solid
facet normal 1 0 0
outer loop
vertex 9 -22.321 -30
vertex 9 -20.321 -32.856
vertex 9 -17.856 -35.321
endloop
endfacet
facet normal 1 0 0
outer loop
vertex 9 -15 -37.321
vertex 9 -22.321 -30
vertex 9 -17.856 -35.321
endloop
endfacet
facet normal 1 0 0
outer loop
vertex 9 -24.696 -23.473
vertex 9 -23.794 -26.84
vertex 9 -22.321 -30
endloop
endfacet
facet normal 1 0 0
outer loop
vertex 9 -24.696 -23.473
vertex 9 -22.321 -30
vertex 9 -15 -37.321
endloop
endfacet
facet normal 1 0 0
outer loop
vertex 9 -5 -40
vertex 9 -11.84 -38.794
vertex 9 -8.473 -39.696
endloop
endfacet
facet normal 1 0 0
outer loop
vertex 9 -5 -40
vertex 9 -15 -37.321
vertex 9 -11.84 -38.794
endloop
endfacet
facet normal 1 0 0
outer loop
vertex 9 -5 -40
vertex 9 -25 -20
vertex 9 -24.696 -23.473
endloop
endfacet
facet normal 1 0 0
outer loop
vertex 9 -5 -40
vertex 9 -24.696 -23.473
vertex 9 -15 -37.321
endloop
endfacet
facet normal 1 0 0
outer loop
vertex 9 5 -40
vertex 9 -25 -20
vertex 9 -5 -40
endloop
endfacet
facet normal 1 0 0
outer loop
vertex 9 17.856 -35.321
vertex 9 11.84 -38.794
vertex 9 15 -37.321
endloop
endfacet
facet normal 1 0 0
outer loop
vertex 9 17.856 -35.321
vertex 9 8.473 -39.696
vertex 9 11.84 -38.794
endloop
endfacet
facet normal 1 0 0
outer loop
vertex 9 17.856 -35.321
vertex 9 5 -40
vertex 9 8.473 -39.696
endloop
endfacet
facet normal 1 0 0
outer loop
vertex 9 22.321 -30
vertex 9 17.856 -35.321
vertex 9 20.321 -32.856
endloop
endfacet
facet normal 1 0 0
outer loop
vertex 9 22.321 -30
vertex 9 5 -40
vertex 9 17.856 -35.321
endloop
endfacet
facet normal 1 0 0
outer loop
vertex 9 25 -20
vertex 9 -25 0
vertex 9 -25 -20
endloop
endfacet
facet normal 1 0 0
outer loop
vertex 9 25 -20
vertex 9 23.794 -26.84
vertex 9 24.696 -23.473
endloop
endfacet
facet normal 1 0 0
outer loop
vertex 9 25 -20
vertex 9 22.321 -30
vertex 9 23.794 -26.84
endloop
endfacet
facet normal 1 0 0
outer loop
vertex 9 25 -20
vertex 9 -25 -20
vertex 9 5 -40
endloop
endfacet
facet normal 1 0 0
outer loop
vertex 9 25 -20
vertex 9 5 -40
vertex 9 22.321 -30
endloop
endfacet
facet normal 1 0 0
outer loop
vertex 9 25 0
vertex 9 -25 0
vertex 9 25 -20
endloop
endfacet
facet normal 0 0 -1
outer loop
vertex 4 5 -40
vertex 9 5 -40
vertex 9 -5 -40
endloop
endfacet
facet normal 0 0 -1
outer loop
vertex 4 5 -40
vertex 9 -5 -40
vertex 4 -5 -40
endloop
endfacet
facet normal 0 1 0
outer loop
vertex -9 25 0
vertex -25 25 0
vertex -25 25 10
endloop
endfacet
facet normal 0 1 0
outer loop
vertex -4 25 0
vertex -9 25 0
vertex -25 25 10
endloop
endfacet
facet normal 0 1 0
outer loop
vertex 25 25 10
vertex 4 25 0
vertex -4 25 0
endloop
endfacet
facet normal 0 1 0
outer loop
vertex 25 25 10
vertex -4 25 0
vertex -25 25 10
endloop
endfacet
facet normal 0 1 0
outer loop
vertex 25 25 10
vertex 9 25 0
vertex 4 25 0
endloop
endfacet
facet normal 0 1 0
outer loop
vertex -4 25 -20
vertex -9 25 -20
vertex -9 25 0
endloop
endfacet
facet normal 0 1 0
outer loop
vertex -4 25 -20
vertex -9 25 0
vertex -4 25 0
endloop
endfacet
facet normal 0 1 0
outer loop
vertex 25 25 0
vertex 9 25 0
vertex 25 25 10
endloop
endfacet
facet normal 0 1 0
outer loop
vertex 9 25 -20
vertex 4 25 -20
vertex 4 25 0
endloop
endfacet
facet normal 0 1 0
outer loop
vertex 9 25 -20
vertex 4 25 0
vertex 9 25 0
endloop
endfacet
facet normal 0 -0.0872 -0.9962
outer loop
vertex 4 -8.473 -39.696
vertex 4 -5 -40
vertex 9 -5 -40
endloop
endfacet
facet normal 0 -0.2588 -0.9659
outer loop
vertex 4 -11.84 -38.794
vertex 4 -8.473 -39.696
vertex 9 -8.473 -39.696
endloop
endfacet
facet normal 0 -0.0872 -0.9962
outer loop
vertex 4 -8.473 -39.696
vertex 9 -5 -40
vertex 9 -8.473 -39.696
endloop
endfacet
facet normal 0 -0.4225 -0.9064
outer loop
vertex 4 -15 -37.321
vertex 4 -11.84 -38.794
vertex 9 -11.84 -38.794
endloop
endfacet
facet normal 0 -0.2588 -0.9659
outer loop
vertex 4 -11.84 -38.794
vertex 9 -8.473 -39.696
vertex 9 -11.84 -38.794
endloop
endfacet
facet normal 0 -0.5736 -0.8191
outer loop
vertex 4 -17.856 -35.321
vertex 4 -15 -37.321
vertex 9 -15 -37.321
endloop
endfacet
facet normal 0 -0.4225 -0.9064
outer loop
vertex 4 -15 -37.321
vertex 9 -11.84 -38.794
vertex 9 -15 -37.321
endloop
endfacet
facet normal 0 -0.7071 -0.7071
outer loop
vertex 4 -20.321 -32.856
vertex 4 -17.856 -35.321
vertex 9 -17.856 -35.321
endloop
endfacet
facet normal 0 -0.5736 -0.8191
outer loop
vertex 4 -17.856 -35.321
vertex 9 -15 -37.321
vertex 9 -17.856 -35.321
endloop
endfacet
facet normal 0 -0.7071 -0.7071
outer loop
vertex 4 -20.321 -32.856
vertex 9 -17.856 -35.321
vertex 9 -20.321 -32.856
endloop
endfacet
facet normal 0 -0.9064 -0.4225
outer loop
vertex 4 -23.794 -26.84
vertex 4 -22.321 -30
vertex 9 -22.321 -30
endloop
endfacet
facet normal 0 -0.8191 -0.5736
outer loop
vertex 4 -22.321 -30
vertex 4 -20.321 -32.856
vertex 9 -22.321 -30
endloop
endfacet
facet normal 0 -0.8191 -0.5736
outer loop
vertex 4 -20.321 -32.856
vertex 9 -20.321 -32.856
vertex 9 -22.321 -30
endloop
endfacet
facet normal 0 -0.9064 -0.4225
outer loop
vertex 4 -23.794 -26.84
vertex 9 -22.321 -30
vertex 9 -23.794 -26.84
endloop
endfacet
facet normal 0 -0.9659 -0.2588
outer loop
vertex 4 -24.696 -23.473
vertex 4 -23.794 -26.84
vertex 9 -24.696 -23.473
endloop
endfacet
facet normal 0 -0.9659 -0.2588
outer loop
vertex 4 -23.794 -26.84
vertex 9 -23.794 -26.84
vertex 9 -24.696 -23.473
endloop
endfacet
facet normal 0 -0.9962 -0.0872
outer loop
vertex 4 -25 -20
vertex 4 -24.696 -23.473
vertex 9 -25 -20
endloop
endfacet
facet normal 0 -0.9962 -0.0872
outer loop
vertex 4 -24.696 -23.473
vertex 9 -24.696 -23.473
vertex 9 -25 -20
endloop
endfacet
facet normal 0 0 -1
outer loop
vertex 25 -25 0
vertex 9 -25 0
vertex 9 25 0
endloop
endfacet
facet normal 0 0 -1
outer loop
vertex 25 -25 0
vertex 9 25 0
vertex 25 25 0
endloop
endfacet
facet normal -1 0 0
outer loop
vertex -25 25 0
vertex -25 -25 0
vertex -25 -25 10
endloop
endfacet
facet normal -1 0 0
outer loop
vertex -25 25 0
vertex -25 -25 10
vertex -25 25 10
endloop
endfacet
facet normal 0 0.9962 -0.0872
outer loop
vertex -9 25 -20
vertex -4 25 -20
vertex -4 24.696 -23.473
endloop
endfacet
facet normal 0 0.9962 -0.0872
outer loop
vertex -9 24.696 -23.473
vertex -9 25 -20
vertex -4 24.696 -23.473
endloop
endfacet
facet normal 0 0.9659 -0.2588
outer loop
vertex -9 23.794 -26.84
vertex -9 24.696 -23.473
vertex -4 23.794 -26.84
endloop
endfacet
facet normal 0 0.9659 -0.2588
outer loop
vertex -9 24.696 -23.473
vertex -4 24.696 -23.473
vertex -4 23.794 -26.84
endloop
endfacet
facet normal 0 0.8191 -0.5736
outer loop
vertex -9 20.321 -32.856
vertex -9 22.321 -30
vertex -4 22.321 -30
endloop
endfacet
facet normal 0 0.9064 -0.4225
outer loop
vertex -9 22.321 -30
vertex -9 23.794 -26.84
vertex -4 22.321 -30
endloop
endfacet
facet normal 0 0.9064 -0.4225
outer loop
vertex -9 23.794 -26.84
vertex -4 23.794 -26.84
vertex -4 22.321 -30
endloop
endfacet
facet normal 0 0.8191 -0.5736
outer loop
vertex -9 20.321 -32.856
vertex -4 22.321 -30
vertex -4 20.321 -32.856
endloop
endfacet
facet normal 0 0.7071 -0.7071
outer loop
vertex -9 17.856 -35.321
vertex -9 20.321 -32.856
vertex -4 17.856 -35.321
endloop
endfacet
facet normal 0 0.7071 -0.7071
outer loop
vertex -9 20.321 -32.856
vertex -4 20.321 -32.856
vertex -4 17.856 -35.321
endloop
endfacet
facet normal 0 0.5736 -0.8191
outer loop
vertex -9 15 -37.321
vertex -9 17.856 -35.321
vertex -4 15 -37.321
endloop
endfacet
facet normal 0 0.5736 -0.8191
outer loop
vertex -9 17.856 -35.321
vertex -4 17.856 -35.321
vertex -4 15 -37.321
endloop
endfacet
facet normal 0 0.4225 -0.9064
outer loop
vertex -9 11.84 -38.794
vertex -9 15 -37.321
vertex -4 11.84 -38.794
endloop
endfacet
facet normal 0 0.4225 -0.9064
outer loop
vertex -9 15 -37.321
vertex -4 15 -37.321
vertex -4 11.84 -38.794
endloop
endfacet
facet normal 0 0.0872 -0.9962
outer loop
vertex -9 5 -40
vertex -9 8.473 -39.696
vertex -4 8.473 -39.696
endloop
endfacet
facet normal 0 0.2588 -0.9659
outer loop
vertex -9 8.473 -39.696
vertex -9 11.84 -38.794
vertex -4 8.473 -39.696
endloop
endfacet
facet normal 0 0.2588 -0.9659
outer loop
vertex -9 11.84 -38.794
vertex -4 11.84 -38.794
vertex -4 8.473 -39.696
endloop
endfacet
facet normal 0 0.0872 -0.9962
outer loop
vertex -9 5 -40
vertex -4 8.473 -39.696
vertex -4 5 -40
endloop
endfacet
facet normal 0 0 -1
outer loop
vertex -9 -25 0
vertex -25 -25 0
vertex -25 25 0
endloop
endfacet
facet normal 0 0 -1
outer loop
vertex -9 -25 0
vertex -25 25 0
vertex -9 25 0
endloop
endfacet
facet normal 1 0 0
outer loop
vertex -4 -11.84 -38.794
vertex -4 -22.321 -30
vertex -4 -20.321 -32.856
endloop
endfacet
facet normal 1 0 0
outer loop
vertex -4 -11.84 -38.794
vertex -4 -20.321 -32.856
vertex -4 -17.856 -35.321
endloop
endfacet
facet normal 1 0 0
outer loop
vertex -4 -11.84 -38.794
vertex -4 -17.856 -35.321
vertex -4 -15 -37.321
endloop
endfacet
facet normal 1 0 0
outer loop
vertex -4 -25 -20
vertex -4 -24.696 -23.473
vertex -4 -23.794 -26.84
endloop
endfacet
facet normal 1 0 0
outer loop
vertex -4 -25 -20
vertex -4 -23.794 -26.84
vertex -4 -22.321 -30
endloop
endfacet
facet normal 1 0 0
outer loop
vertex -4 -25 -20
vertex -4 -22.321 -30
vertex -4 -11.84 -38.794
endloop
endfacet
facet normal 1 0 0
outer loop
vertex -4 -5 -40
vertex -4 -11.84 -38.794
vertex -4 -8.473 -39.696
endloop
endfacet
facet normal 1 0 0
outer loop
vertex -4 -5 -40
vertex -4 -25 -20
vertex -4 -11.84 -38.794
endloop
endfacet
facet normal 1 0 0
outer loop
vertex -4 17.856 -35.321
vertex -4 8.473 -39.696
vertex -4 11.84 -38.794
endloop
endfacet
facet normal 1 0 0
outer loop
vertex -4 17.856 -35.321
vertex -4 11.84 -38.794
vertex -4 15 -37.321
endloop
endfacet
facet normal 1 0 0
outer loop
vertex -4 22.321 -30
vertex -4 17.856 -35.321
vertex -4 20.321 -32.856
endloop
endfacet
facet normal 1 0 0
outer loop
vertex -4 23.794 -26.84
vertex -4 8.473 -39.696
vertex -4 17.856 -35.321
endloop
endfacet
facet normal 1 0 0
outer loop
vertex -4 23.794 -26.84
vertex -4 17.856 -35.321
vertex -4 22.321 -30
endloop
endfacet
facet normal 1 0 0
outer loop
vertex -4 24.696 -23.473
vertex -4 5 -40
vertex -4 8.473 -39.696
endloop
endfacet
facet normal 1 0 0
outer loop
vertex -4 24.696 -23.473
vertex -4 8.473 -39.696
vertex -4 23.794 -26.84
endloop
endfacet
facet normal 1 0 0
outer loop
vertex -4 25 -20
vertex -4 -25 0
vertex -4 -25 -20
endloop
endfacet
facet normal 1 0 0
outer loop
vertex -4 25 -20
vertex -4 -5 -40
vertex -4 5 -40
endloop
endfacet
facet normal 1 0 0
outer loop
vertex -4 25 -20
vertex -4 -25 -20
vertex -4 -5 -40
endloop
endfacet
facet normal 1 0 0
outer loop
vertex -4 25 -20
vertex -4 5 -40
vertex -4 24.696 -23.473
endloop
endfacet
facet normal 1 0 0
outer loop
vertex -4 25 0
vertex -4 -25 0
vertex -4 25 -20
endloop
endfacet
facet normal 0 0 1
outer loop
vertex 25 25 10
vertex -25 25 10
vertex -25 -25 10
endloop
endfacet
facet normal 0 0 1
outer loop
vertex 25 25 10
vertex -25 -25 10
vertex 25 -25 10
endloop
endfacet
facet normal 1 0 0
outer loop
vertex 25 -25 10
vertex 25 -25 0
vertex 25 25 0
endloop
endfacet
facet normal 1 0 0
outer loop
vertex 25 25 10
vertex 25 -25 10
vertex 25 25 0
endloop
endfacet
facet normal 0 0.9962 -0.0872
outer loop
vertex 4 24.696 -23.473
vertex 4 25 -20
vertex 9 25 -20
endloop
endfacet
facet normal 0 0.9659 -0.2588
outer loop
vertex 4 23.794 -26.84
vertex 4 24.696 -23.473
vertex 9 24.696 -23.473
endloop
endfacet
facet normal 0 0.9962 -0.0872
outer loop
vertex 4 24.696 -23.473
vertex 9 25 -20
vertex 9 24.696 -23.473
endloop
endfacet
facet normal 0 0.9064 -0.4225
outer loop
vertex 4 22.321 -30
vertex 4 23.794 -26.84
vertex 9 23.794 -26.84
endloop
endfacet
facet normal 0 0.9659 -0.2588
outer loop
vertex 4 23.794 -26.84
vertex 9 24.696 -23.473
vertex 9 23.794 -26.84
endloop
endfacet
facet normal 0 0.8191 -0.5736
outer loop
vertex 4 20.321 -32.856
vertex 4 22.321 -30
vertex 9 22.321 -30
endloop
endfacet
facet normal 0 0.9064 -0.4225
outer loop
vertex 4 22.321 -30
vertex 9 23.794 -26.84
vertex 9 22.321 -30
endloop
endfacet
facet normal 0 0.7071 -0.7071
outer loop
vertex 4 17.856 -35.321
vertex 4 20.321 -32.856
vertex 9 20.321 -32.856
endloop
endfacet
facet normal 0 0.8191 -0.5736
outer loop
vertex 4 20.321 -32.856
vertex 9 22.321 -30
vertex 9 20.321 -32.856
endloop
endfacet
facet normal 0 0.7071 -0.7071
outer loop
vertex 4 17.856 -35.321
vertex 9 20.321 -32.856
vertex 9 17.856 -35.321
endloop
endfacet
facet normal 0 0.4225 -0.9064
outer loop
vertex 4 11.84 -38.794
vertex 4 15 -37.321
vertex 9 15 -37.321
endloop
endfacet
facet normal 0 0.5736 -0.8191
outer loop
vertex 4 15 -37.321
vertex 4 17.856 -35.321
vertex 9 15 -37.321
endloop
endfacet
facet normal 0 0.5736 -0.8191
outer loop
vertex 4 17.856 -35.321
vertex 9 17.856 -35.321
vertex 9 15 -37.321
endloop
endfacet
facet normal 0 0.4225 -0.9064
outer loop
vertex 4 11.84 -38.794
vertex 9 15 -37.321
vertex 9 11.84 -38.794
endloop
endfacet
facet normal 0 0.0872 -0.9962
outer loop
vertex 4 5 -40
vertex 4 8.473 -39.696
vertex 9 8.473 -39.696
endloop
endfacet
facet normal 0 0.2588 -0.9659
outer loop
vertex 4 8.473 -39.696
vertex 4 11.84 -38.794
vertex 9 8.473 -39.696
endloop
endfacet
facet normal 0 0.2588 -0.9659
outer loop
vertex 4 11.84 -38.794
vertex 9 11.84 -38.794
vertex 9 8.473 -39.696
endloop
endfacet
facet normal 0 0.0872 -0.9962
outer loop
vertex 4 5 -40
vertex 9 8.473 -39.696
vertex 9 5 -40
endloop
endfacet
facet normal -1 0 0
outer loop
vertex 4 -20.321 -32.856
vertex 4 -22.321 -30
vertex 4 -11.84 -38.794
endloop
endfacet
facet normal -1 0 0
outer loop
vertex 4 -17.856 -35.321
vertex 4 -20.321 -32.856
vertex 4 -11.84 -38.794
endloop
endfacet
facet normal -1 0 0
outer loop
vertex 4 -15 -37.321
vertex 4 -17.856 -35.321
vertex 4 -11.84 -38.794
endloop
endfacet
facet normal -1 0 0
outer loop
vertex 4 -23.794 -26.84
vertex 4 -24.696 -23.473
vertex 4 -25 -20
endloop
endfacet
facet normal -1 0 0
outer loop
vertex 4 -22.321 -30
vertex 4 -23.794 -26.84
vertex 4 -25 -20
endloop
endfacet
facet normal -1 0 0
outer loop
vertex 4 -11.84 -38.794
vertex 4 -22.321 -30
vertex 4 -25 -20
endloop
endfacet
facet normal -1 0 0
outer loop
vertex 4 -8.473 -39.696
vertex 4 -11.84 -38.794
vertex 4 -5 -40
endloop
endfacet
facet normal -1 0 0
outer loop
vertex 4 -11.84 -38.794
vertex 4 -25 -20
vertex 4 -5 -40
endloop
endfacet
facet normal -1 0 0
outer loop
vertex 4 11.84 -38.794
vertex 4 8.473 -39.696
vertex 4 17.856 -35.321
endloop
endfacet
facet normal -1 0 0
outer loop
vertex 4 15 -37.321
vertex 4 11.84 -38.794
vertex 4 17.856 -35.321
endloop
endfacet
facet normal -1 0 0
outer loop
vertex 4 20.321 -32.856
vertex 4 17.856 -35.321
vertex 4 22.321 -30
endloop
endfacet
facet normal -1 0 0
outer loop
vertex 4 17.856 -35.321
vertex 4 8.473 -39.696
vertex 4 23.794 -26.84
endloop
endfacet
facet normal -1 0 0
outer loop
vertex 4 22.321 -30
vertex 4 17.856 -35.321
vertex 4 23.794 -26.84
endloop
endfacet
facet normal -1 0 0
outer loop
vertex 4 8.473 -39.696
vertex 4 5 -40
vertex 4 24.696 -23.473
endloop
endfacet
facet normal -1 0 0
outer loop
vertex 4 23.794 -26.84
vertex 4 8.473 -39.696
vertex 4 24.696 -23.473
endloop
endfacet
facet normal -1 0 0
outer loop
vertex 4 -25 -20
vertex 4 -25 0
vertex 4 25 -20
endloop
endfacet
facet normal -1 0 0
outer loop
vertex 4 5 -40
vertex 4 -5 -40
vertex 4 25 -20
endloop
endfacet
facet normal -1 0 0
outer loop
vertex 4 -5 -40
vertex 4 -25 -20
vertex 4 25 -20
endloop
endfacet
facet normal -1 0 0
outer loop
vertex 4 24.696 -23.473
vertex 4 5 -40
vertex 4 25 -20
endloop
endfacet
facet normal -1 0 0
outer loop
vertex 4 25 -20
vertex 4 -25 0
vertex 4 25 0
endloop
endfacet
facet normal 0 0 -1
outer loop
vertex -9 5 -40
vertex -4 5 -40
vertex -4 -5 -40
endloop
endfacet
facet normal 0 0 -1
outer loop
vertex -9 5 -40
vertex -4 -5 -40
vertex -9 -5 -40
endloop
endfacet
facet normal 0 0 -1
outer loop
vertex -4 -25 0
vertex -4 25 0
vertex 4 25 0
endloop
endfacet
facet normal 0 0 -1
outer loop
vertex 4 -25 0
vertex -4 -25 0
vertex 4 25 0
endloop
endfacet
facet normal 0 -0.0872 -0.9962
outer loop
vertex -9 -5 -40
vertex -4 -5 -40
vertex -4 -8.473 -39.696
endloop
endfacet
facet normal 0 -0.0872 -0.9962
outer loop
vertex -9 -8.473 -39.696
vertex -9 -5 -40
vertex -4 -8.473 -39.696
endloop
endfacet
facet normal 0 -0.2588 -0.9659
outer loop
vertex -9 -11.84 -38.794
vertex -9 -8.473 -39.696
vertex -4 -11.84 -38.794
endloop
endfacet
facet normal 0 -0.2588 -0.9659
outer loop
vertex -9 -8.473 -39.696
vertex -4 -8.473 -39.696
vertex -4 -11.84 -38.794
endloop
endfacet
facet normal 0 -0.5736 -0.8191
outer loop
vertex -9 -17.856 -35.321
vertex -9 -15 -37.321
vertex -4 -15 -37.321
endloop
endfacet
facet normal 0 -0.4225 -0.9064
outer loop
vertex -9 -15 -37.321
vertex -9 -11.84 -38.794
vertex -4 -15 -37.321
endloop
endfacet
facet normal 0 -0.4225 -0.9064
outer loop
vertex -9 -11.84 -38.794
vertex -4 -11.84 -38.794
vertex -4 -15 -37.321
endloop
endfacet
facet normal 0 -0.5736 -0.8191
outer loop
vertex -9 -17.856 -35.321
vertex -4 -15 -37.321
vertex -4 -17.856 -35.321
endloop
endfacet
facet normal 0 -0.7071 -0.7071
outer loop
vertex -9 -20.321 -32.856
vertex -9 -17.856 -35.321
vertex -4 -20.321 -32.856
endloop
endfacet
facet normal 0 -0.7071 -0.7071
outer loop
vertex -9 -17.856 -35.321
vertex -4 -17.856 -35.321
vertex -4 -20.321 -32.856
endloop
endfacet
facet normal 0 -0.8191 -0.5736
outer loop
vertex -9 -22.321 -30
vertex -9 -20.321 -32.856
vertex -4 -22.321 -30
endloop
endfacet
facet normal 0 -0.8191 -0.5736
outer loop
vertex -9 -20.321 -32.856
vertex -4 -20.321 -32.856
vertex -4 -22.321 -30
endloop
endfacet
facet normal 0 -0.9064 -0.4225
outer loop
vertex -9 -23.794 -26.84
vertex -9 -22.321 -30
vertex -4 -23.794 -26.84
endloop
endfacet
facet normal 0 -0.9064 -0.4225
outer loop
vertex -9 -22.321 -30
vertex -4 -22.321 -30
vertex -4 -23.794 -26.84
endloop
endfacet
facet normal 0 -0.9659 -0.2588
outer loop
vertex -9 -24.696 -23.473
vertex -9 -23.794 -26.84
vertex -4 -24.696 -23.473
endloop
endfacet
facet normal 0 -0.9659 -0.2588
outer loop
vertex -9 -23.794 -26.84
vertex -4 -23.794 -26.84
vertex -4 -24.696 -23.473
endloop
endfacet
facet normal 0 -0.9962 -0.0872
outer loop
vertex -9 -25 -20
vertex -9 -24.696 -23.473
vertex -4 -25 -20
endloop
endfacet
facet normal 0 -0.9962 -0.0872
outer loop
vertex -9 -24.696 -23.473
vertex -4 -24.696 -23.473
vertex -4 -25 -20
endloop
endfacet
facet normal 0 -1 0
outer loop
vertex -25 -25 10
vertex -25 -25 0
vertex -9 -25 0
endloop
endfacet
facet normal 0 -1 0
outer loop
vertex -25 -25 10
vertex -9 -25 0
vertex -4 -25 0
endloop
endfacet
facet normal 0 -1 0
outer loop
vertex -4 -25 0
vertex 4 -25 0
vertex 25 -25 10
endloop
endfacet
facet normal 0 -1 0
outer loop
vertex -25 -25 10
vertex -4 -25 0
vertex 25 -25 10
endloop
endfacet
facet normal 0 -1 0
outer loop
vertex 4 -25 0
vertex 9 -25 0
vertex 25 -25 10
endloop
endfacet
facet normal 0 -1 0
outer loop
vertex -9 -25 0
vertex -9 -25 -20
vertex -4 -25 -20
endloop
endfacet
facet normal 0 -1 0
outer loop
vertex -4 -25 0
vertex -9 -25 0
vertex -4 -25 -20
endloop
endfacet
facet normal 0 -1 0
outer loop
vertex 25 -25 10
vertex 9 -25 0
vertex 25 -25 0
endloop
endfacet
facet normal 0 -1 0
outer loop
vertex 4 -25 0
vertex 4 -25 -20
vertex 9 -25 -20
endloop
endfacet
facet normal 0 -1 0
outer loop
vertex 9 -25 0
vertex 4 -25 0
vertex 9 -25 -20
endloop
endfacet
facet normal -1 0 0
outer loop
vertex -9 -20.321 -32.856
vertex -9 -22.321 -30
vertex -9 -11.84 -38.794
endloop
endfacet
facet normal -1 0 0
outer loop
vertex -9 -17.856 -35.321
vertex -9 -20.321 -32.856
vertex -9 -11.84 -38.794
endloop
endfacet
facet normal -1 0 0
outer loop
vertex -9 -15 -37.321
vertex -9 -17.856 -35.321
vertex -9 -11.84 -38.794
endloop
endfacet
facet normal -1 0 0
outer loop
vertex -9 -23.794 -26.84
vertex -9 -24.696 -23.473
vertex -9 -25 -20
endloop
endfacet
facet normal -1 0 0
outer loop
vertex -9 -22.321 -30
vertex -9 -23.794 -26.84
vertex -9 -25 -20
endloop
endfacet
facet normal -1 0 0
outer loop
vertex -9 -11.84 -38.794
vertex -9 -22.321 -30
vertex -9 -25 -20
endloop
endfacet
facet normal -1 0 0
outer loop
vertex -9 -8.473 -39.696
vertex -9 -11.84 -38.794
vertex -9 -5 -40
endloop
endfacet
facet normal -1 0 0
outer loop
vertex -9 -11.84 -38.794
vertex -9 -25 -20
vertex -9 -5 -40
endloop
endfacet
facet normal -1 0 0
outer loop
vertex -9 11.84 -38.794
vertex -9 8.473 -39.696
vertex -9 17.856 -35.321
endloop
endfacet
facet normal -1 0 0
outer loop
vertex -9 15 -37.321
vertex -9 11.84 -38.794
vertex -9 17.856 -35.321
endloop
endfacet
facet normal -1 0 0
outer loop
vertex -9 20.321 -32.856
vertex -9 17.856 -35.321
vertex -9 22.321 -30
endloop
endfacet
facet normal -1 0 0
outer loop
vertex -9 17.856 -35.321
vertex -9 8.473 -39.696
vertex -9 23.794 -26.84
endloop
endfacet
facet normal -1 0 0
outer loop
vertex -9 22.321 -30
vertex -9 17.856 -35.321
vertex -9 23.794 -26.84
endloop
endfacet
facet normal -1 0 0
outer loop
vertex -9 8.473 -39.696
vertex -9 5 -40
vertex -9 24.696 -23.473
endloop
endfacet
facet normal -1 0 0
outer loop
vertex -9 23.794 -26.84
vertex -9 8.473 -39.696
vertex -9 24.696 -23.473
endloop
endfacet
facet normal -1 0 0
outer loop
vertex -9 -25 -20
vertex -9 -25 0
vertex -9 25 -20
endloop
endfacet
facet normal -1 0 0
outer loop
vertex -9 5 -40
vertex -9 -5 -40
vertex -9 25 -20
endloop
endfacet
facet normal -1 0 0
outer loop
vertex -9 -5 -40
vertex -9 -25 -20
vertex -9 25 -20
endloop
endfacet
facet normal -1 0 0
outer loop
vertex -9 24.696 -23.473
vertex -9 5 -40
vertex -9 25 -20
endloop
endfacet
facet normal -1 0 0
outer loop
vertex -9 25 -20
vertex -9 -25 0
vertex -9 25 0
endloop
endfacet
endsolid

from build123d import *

# Parameters (mm, degrees)
SZKIC1_W                                   = 50
SZKIC1_H                                   = 50
DODANIE_WYCI_GNI_CIE1_DEPTH                = 10
SZKIC2_W                                   = 5
SZKIC2_H                                   = 50
DODANIE_WYCI_GNI_CIE2_DEPTH                = 40
WYCI_CIE_WYCI_GNI_CIE_CIENKA_CIANKA2_DEPTH = 40


with BuildPart() as part:
    # Szkic1 → Dodanie-wyciągnięcie1 (new body)
    with BuildSketch(Plane.XY):
        Rectangle(SZKIC1_W, SZKIC1_H)
    extrude(amount=DODANIE_WYCI_GNI_CIE1_DEPTH)

    # Szkic2 → Dodanie-wyciągnięcie2 (add)
    with BuildSketch(Plane(origin=(0, 0, 0), x_dir=(-1, 0, 0), z_dir=(0, 0, -1))):
        with Locations((-6.5, 0)):
            Rectangle(SZKIC2_W, SZKIC2_H)
        with Locations((6.5, 0)):
            Rectangle(SZKIC2_W, SZKIC2_H)
    extrude(amount=DODANIE_WYCI_GNI_CIE2_DEPTH)

    # Szkic4 → Wycięcie-wyciągnięcie-cienka ścianka2 (cut)
    with BuildSketch(Plane(origin=(9, 0, 0), x_dir=(0, 0, -1), z_dir=(1, 0, 0))):
        with BuildLine():
            ThreePointArc((40, -5), (34.142135624, -19.142135624), (20, -25))
            Line((20, -25), (20, -35))
            ThreePointArc((20, -35), (41.213203436, -26.213203436), (50, -5))
            Line((50, -5), (40, -5))
        make_face()
        with BuildLine():
            ThreePointArc((20, 25), (34.142135624, 19.142135624), (40, 5))
            Line((40, 5), (50, 5))
            ThreePointArc((50, 5), (41.213203436, 26.213203436), (20, 35))
            Line((20, 35), (20, 25))
        make_face()
    extrude(amount=-WYCI_CIE_WYCI_GNI_CIE_CIENKA_CIANKA2_DEPTH, mode=Mode.SUBTRACT)


solid = part.part
